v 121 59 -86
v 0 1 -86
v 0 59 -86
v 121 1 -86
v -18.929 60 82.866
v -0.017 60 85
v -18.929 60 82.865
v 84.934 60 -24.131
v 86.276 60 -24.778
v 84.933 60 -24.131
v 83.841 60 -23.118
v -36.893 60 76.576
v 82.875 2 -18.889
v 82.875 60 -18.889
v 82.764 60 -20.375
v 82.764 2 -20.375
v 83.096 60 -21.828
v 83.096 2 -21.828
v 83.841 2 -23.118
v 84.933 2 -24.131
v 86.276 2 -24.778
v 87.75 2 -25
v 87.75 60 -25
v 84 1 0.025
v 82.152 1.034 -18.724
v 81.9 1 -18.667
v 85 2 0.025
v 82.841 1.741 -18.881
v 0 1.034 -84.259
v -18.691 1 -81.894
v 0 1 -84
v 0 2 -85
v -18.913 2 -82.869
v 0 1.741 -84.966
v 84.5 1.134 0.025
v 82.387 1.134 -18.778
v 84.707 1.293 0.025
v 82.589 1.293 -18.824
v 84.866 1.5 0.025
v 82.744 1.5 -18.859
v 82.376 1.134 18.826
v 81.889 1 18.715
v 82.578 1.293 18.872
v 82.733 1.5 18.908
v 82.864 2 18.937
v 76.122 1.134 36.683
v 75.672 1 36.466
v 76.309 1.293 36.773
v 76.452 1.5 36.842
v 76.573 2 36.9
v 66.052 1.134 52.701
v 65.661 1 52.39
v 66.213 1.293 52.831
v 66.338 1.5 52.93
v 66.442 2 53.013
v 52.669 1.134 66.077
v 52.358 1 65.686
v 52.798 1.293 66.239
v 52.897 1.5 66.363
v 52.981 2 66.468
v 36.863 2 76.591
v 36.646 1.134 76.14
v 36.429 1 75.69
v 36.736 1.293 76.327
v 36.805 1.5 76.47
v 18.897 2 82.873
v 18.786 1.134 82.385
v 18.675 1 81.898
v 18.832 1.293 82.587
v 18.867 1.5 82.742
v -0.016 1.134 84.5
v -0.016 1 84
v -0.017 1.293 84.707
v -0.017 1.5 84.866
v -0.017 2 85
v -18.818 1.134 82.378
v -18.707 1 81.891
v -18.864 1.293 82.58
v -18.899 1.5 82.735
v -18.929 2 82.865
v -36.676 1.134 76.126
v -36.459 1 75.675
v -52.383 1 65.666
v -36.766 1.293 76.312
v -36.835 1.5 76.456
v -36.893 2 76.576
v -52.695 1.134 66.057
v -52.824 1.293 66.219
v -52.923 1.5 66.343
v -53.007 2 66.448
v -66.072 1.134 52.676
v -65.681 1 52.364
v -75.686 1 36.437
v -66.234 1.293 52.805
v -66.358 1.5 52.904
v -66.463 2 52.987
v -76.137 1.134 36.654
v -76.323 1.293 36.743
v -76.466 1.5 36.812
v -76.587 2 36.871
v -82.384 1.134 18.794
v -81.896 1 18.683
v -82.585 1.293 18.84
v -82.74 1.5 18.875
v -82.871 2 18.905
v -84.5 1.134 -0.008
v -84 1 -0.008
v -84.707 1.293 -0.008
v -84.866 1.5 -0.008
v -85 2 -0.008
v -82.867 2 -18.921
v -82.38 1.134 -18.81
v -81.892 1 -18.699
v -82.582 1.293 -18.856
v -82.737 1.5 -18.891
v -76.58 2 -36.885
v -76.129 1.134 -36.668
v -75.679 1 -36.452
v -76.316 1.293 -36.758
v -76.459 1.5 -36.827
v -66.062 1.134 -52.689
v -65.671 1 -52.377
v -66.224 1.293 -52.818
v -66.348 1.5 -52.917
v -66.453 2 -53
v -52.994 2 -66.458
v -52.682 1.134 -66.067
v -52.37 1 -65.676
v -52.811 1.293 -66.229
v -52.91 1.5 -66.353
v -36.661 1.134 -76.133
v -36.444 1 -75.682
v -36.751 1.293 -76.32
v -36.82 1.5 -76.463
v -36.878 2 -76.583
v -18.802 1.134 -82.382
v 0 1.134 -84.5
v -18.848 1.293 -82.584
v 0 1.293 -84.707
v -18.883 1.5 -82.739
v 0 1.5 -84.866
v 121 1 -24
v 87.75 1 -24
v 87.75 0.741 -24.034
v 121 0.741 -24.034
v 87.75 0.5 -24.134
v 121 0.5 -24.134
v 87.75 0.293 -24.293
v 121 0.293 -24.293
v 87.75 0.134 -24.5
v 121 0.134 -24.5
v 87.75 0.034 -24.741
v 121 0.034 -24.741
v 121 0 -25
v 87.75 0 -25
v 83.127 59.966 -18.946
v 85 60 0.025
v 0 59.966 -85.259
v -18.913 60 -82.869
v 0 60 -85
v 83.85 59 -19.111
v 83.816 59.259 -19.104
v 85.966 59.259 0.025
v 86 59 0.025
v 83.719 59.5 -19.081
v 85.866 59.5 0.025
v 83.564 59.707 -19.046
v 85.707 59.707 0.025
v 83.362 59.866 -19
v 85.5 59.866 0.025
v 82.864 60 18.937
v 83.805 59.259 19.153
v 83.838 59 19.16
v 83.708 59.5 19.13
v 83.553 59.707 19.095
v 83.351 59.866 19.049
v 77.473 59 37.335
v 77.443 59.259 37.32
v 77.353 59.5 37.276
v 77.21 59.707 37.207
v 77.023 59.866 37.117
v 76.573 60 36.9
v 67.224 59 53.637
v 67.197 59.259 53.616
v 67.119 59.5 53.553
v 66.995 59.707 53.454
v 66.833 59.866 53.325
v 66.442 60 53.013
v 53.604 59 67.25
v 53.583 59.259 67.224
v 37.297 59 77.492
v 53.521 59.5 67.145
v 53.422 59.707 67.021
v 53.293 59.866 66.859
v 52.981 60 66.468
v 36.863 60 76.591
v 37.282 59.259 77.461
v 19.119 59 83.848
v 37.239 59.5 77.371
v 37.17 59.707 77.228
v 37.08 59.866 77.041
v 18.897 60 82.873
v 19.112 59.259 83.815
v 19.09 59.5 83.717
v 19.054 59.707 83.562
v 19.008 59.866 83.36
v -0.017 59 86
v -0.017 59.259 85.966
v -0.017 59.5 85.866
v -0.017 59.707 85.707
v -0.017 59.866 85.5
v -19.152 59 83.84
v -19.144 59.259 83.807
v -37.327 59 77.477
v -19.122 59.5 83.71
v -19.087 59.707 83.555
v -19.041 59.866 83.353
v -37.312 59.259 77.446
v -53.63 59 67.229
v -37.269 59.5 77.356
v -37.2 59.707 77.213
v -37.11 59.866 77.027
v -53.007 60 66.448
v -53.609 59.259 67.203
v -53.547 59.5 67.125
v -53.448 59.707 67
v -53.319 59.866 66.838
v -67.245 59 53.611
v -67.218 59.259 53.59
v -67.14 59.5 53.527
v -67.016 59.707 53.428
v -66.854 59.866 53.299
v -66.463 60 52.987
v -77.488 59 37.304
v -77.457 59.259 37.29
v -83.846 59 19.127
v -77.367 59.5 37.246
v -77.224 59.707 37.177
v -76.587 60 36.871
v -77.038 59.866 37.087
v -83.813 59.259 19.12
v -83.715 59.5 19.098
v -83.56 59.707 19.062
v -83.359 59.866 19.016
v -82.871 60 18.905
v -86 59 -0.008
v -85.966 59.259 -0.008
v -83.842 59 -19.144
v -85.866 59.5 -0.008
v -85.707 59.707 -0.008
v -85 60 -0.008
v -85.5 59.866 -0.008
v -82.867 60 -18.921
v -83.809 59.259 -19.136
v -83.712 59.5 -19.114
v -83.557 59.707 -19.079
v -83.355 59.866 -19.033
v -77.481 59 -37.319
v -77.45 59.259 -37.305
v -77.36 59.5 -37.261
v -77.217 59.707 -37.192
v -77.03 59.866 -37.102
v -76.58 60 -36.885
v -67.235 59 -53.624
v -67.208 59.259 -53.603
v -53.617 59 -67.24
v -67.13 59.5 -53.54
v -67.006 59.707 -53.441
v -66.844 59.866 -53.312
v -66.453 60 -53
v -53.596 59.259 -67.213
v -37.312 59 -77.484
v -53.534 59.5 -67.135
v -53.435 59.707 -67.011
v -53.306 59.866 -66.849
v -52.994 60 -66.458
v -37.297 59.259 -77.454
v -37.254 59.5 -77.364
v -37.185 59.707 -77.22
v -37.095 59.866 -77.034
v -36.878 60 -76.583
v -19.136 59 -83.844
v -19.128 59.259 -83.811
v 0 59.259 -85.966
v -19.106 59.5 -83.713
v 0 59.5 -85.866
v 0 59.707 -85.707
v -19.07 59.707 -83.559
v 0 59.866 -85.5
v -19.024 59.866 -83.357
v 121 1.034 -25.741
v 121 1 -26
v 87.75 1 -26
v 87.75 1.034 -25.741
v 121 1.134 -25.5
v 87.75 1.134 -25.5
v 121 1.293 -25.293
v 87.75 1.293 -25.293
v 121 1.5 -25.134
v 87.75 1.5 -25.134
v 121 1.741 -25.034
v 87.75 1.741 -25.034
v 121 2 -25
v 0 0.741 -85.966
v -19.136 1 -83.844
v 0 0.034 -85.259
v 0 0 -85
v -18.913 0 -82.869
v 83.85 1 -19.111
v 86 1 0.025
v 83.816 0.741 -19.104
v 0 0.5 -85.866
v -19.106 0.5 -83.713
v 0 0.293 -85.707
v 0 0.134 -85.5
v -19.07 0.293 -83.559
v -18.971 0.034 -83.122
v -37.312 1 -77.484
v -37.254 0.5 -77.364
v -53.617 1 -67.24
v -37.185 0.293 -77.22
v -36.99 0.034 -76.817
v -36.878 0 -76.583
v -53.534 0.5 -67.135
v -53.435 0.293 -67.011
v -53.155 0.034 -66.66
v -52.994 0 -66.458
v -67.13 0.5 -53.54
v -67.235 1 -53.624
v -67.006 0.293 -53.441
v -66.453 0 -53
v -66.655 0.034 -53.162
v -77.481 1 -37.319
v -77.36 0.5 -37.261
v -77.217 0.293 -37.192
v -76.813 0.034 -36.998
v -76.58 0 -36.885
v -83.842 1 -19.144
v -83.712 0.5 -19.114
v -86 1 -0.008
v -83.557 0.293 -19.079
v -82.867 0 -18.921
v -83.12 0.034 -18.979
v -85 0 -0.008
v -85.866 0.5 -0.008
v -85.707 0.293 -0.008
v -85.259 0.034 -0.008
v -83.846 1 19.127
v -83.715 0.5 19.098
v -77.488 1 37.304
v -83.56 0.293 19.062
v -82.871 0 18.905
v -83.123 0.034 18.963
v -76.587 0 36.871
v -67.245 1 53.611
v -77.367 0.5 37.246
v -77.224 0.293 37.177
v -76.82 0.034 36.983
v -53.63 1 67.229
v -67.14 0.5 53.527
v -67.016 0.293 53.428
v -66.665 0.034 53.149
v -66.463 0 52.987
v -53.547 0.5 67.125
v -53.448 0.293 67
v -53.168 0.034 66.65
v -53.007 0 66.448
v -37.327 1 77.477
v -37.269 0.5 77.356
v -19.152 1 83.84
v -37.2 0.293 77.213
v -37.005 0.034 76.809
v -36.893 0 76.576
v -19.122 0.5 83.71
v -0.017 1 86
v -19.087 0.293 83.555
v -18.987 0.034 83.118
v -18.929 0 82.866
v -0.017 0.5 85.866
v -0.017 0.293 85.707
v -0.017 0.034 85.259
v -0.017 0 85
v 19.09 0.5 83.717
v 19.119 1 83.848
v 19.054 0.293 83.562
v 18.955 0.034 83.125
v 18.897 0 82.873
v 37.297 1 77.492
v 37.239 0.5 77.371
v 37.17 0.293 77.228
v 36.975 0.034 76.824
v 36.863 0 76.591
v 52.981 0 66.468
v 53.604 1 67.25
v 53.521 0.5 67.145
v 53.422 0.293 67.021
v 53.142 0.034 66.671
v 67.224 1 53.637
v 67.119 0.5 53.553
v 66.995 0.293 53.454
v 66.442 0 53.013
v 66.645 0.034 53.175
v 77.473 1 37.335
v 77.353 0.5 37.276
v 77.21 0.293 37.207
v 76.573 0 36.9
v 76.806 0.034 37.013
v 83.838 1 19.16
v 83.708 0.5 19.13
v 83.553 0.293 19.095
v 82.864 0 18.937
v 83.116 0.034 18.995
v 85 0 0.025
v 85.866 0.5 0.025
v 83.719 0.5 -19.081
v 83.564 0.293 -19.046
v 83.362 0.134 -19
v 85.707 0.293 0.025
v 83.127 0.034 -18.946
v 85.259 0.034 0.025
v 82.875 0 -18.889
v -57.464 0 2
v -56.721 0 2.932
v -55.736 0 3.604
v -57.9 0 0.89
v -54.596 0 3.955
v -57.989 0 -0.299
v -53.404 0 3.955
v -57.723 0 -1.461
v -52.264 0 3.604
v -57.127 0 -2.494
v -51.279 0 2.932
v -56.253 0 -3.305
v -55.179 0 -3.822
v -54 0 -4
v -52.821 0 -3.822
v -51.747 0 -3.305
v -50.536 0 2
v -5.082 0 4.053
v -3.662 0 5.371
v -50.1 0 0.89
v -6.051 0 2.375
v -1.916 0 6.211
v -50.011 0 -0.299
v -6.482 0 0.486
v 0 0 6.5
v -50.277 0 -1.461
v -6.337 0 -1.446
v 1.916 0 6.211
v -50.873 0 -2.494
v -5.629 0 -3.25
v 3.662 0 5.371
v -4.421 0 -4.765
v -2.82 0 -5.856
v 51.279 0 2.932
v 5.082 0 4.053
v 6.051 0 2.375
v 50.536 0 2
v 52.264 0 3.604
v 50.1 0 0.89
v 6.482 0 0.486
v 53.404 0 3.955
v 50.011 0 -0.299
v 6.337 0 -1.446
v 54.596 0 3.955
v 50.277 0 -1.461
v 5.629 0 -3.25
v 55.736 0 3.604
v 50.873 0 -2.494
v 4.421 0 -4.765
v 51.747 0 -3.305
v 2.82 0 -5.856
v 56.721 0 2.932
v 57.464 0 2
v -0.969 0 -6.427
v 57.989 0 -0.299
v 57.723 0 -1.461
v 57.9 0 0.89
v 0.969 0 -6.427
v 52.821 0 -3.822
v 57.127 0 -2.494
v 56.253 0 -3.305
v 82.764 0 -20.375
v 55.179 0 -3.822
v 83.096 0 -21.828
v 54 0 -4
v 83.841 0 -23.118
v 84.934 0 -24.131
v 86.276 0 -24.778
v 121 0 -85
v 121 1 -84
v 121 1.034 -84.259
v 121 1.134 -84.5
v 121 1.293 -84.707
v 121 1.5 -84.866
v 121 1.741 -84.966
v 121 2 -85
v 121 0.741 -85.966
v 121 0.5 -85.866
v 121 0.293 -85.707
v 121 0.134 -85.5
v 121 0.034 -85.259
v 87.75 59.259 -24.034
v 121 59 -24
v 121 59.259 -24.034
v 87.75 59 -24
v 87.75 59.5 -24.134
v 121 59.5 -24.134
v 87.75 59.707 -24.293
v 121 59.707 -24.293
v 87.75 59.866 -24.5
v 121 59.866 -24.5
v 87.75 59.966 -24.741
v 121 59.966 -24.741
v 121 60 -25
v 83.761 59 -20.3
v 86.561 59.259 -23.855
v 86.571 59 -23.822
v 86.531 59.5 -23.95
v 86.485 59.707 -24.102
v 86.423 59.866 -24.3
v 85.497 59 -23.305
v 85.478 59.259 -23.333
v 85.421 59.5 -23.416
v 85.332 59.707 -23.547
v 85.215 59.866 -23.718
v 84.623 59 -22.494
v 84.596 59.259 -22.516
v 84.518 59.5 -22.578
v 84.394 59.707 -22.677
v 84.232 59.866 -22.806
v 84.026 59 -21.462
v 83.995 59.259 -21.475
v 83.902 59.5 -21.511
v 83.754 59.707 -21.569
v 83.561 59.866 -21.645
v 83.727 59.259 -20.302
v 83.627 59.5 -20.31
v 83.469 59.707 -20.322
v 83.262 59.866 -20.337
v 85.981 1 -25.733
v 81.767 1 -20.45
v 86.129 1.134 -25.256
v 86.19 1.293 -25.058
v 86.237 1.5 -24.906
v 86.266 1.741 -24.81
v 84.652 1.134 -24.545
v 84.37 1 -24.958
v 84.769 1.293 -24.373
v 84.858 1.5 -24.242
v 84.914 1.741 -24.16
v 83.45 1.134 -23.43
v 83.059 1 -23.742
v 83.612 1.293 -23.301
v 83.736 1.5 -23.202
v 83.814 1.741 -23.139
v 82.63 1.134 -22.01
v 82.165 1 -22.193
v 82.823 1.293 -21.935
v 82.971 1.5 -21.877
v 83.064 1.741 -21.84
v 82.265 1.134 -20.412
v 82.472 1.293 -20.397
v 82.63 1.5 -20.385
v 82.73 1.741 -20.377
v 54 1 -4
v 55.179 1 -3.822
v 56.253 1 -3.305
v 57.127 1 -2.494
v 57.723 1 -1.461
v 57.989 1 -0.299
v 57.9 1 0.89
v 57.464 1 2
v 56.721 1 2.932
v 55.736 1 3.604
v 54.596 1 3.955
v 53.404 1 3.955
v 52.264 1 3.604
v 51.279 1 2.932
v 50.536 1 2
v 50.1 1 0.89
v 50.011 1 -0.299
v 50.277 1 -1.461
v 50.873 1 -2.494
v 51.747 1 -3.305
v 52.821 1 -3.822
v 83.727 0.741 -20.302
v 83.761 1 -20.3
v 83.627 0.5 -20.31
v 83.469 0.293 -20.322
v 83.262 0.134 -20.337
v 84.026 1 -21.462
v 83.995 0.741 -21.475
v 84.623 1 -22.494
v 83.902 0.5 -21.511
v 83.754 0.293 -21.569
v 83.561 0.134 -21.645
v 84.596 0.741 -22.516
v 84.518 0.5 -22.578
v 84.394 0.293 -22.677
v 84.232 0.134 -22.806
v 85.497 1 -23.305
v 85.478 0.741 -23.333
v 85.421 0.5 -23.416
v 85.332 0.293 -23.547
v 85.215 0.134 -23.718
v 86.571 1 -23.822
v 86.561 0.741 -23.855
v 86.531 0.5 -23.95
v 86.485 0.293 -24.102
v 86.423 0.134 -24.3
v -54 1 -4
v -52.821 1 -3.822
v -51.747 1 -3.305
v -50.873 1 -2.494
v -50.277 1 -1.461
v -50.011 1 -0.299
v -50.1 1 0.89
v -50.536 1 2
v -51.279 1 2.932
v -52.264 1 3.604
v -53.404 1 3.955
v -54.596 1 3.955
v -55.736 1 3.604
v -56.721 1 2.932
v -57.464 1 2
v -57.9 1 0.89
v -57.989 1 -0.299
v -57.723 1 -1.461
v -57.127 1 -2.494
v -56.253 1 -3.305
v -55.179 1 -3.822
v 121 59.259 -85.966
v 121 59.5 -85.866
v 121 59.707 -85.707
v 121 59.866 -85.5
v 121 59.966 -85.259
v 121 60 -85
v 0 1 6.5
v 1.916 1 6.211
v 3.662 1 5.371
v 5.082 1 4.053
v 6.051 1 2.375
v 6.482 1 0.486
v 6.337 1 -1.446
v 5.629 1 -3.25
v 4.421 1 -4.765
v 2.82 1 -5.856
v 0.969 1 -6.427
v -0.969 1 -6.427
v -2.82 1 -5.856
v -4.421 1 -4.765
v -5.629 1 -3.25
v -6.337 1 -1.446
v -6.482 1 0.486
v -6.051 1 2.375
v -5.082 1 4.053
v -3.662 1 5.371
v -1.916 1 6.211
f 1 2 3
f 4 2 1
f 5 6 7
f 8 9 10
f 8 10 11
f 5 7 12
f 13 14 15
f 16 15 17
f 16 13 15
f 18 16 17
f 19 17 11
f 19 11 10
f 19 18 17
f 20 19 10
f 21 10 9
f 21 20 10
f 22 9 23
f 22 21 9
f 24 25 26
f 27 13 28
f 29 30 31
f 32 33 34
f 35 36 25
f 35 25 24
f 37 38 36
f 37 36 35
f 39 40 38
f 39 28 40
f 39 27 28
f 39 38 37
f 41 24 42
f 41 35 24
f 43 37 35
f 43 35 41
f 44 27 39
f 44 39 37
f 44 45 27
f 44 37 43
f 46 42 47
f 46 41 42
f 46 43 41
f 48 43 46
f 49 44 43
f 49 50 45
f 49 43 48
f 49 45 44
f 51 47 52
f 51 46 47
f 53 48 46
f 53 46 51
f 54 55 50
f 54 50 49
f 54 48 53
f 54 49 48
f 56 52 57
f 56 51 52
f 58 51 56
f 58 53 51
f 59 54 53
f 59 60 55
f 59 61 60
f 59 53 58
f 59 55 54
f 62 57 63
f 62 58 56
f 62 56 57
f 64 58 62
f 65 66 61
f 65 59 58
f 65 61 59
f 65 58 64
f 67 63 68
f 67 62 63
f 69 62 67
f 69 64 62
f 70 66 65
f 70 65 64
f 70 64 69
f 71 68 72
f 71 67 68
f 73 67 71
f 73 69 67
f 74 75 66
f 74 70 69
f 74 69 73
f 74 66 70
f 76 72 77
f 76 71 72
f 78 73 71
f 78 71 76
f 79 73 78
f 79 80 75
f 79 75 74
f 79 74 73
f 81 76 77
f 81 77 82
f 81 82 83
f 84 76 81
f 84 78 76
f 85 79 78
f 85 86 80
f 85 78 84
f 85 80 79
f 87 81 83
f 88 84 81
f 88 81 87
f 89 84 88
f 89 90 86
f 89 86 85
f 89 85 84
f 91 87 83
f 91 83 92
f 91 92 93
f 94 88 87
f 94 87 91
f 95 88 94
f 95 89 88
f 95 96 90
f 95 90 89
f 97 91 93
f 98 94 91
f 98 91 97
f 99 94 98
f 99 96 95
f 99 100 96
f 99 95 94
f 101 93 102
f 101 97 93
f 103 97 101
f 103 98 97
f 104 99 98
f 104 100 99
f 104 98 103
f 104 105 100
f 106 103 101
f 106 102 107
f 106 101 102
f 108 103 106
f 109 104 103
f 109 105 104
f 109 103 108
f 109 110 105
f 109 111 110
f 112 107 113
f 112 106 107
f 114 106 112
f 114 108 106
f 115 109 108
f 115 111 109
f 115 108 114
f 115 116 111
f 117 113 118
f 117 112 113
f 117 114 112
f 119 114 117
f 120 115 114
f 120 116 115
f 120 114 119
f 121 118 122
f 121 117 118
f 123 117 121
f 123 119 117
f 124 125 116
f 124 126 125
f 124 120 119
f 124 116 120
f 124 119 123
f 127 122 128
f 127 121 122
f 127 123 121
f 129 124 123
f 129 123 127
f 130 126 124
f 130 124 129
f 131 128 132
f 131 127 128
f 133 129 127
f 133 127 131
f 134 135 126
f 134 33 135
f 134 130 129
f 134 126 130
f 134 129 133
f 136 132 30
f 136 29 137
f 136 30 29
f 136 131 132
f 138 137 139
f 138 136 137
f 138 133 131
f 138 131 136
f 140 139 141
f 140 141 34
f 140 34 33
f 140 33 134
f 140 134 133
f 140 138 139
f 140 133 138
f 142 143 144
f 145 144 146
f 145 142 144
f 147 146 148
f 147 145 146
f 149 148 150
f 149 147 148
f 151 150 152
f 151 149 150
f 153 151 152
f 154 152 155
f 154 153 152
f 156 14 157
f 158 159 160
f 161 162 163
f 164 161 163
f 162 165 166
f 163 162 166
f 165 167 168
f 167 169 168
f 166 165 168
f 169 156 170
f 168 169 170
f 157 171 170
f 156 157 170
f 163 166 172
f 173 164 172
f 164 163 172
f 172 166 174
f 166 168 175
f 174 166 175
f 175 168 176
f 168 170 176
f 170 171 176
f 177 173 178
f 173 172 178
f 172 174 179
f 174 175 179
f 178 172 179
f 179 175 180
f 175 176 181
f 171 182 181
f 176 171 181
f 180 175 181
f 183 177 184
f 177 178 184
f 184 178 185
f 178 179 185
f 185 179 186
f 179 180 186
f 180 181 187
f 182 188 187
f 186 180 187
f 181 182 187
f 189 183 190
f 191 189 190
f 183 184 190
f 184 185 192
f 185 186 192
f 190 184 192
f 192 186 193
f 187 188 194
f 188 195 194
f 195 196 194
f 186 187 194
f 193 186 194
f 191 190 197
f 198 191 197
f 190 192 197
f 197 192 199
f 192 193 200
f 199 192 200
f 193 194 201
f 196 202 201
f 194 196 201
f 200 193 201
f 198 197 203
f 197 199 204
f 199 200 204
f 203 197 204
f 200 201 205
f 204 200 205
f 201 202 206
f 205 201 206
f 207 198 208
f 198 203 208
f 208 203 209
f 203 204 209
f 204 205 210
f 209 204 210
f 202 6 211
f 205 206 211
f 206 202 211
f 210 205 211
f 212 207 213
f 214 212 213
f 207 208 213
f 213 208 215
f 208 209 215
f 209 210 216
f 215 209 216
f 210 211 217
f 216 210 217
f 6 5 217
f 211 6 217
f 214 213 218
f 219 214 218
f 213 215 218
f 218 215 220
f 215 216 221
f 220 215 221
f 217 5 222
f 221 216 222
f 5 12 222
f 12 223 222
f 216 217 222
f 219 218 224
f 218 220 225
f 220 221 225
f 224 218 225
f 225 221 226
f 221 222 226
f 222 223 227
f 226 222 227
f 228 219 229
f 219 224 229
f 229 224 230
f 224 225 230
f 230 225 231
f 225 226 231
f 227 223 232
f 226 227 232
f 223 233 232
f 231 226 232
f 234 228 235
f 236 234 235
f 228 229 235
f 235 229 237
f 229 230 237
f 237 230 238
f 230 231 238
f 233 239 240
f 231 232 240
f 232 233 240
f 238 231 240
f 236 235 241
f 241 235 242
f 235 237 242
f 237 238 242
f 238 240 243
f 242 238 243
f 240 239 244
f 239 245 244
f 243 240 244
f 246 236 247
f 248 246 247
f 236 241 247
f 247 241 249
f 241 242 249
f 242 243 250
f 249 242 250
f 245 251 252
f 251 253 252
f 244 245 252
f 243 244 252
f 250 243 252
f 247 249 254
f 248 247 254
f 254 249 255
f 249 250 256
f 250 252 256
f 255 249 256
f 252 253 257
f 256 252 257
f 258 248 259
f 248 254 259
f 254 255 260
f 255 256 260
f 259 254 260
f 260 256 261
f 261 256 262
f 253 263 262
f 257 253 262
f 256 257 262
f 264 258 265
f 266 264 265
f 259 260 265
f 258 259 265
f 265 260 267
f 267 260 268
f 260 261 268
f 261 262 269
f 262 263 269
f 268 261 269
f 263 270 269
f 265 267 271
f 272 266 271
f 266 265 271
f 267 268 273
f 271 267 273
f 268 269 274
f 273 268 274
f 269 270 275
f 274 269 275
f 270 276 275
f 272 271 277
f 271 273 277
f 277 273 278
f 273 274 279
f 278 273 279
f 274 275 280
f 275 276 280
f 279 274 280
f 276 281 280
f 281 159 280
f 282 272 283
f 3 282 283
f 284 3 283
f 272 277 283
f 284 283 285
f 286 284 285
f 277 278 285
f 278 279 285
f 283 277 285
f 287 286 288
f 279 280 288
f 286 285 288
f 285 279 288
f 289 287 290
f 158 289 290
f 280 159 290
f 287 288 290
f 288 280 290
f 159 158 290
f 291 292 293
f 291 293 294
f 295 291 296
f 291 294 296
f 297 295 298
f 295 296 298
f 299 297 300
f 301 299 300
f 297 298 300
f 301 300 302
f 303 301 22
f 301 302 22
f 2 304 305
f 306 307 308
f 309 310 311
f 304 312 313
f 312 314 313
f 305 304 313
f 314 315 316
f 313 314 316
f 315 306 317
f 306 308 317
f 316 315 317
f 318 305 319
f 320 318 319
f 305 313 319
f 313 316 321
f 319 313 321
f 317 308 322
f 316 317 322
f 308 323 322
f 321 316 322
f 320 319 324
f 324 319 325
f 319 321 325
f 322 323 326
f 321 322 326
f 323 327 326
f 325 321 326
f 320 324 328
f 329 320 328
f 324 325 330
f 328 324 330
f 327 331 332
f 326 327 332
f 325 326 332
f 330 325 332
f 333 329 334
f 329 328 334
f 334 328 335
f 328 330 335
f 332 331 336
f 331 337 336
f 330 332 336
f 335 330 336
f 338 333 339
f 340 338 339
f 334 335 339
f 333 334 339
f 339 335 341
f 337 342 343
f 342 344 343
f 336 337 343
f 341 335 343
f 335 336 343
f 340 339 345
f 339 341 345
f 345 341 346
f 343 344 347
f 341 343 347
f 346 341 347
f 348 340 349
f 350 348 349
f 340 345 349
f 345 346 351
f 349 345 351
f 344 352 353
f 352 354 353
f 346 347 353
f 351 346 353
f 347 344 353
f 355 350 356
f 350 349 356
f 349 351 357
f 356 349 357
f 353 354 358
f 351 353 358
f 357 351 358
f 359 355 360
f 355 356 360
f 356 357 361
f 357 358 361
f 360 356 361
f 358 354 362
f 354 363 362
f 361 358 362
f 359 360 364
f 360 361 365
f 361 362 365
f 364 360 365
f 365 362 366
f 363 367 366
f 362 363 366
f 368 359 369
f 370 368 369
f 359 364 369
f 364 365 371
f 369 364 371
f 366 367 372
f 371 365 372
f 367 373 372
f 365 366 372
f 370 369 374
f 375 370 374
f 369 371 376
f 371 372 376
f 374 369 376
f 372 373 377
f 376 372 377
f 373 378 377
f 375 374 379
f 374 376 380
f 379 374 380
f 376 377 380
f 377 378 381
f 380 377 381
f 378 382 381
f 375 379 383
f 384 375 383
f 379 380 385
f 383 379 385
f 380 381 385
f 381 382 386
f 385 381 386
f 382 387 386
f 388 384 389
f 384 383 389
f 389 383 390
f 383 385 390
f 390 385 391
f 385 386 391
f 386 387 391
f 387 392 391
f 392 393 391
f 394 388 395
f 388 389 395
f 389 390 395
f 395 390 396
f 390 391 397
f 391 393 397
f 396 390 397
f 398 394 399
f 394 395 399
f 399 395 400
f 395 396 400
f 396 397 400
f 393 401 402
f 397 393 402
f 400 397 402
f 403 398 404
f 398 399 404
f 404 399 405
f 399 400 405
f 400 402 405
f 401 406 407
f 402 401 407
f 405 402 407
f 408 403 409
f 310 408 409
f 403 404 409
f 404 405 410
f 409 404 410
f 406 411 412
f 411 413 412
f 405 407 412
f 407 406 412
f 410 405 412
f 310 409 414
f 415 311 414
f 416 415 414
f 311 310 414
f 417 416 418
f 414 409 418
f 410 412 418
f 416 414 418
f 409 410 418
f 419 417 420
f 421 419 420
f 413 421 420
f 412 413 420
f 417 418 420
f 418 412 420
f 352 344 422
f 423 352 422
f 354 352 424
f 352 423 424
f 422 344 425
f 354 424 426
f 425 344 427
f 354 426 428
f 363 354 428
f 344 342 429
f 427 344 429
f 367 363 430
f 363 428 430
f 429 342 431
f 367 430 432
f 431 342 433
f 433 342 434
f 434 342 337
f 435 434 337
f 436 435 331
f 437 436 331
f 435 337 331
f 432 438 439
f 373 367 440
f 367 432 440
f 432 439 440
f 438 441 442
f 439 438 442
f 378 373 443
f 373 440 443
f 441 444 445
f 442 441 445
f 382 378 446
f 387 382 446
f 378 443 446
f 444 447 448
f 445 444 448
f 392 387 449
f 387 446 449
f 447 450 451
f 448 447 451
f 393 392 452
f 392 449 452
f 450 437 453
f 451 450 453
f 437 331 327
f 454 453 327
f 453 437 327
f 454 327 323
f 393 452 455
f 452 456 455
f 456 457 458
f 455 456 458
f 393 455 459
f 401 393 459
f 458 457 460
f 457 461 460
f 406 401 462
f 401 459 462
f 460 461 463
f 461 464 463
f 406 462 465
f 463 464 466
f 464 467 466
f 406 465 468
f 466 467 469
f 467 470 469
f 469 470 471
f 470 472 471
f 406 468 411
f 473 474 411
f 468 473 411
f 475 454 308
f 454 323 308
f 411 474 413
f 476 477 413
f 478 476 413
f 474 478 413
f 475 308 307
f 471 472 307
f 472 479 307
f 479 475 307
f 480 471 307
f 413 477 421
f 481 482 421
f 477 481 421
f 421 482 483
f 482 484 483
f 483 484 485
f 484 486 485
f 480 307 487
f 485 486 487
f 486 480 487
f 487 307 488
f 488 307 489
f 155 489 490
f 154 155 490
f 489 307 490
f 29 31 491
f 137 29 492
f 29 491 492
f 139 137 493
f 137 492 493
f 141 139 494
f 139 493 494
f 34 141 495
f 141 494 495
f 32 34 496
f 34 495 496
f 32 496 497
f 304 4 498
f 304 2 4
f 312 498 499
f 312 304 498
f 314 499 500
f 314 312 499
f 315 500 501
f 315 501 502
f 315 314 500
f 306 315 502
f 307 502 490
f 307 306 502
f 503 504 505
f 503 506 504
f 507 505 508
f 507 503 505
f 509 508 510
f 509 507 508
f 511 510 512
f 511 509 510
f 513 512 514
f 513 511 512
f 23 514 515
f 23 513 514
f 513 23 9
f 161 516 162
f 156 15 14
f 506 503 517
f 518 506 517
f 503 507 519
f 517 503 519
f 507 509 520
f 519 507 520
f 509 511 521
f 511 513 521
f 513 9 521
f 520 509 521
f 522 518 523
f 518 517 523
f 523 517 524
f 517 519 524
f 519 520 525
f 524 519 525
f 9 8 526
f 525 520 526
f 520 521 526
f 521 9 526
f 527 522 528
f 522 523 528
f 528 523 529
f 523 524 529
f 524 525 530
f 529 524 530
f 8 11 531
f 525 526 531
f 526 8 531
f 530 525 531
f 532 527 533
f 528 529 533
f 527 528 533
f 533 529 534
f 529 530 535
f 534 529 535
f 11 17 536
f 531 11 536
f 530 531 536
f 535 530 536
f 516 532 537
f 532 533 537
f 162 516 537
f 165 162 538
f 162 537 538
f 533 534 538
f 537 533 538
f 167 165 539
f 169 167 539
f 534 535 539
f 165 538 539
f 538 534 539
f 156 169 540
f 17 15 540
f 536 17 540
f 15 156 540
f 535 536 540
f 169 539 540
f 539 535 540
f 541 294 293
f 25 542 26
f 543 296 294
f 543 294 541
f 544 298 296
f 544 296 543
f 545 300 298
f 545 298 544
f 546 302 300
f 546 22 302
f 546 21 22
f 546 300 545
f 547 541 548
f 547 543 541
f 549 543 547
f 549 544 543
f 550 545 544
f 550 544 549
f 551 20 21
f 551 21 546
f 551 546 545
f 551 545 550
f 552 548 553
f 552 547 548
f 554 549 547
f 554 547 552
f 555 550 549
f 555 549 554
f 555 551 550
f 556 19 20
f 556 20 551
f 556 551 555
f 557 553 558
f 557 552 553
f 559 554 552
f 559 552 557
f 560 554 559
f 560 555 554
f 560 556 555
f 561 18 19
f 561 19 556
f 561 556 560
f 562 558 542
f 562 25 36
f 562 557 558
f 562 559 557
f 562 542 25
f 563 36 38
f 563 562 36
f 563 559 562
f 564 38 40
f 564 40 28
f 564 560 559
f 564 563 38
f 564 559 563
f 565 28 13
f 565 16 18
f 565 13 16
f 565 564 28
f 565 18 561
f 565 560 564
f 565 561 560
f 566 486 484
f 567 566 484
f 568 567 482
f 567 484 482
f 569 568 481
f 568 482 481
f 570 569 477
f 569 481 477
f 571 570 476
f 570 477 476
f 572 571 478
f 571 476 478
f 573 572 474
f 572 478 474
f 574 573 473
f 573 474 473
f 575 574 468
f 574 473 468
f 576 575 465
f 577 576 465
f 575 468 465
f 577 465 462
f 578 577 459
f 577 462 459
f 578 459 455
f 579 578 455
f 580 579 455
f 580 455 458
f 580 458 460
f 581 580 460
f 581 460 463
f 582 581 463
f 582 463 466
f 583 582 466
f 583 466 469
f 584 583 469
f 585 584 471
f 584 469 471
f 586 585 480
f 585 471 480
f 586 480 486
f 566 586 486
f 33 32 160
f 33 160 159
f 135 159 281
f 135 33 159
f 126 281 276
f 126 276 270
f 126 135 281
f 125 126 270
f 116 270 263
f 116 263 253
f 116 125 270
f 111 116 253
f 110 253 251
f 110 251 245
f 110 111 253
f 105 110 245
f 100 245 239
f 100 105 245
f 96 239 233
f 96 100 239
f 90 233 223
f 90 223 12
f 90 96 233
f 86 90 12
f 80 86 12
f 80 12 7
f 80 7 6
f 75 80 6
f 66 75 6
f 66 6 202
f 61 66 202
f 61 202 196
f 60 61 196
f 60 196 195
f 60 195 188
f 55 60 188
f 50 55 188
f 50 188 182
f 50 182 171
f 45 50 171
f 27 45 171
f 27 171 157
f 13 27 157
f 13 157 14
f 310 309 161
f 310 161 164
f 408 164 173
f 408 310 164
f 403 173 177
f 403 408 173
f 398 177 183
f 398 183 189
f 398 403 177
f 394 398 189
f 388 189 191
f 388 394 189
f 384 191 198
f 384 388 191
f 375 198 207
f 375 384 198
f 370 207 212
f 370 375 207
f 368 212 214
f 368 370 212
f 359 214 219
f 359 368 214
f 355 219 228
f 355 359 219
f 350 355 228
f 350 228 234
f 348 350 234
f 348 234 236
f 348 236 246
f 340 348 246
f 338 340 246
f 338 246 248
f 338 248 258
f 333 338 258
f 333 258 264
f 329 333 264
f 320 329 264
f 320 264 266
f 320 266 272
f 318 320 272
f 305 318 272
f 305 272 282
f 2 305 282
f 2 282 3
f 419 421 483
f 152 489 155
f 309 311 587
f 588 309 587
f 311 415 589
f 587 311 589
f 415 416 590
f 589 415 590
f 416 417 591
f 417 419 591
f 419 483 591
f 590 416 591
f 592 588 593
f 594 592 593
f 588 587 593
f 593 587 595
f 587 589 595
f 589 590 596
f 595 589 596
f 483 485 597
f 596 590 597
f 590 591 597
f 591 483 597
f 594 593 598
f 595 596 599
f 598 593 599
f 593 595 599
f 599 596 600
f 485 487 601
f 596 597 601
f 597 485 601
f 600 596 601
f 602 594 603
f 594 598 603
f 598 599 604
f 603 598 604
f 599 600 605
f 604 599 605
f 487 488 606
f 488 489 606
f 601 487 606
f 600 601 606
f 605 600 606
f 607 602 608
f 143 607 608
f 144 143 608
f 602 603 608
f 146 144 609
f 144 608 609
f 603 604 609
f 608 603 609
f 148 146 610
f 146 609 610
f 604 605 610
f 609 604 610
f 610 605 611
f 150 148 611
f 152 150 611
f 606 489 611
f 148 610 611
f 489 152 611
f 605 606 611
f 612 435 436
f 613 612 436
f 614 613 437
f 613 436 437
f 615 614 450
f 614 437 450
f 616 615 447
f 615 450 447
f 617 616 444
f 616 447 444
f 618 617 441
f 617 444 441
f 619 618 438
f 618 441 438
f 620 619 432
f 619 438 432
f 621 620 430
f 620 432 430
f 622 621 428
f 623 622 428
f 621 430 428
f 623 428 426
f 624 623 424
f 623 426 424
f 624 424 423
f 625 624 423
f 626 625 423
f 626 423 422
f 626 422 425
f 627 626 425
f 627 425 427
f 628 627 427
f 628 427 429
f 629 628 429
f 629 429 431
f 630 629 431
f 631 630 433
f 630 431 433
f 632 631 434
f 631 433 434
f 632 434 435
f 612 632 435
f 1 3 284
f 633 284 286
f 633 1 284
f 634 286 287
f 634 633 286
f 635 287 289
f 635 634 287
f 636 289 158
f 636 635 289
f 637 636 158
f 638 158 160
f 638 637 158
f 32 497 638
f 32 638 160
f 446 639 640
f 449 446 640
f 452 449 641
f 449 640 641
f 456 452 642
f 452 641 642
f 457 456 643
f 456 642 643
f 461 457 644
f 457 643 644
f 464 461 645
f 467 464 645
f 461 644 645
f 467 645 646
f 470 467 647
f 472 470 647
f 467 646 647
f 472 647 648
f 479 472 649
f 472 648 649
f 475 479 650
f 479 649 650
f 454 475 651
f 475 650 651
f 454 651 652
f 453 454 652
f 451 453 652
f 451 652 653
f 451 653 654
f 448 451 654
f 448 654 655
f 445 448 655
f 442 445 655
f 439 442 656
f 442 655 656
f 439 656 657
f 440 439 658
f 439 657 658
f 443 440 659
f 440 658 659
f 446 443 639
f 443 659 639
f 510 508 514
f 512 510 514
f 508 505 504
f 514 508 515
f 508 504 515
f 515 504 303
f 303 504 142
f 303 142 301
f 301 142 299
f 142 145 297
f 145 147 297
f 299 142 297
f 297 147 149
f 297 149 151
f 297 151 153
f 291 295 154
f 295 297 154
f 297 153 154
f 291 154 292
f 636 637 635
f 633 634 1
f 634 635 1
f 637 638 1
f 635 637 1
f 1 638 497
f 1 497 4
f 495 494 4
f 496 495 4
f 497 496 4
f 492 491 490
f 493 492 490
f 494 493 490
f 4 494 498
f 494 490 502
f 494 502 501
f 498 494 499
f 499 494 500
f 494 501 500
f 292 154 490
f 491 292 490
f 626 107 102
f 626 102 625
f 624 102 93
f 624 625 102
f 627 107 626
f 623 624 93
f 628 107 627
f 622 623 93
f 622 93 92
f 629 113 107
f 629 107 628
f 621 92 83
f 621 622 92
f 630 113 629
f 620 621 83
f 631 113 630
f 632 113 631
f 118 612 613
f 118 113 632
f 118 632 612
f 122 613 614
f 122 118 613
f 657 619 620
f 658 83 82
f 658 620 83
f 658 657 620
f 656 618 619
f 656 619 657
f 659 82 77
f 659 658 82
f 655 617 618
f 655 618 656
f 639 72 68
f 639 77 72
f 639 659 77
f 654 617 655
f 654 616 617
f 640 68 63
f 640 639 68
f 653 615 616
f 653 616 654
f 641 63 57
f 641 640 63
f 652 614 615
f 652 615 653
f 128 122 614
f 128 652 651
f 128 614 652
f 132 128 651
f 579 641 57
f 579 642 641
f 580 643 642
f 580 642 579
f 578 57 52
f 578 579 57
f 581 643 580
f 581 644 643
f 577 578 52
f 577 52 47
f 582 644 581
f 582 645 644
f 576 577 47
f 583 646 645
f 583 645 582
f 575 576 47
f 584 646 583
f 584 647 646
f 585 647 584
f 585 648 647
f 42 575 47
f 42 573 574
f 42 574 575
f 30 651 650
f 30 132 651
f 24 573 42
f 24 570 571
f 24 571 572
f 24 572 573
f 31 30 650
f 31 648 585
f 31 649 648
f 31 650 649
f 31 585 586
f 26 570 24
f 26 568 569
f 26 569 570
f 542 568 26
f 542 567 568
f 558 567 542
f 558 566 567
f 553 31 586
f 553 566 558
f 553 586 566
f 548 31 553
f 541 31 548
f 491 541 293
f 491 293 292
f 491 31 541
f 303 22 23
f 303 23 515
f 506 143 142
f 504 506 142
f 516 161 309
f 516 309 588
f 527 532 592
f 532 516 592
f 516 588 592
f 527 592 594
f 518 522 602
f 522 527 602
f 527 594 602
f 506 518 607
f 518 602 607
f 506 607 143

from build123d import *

# Parameters (mm, degrees)
BOSS_EXTRUDE1_DEPTH = 1
BOSS_EXTRUDE2_DEPTH = 60
SKETCH2_R           = 6.5
CUT_EXTRUDE1_DEPTH  = 1
FILLET1_R           = 1
SKETCH3_R           = 4
CUT_EXTRUDE2_DEPTH  = 1


with BuildPart() as part:
    # Sketch1 → Boss-Extrude1 (new body)
    with BuildSketch(Plane(origin=(0, 0, 0), x_dir=(1, 0, 0), z_dir=(0, 1, 0))):
        with BuildLine():
            Line((121, 24), (121, 86))
            Line((121, 86), (0, 86))
            ThreePointArc((0, 86), (-53.630422544, -67.229292557), (83.849659702, 19.111111111))
            ThreePointArc((83.849659702, 19.111111111), (84.622700034, 22.494438258), (87.749643874, 24))
            Line((87.749643874, 24), (121, 24))
        make_face()
    extrude(amount=BOSS_EXTRUDE1_DEPTH)

    # Sketch1<3> → Boss-Extrude2 (add)
    with BuildSketch(Plane(origin=(0, 0, 0), x_dir=(1, 0, 0), z_dir=(0, 1, 0))):
        with BuildLine():
            ThreePointArc((87.749643874, 24), (84.622700034, 22.494438258), (83.849659702, 19.111111111))
            ThreePointArc((83.849659702, 19.111111111), (-53.630422544, -67.229292557), (0, 86))
            Line((0, 86), (121, 86))
            Line((121, 86), (121, 85))
            Line((121, 85), (120, 85))
            Line((120, 85), (0, 85))
            ThreePointArc((0, 85), (-53.006812979, -66.447556597), (82.874663659, 18.888888889))
            ThreePointArc((82.874663659, 18.888888889), (83.840964074, 23.118047822), (87.749643874, 25))
            Line((87.749643874, 25), (120, 25))
            Line((120, 25), (121, 25))
            Line((121, 25), (121, 24))
            Line((121, 24), (87.749643874, 24))
        make_face()
    extrude(amount=BOSS_EXTRUDE2_DEPTH)

    # Sketch2 → Cut-Extrude1 (cut)
    with BuildSketch(Plane(origin=(0, 1, 0), x_dir=(1, 0, 0), z_dir=(0, 1, 0))):
        with Locations(Location((0, 0, 0), (0, 0, 270))):
            Circle(SKETCH2_R)
    extrude(amount=-CUT_EXTRUDE1_DEPTH, mode=Mode.SUBTRACT)

    # Fillet1
    fillet1_edges = [part.edges().sort_by_distance(p)[0] for p in [
        (104.374821937, 1, -25),
        (83.840964074, 1, -23.118047822),
        (60.5, 1, -85),
        (60.5, 0, -86),
        (104.374821937, 0, -24),
        (84.622700034, 0, -22.494438258),
        (60.5, 60, -86),
        (104.374821937, 60, -24),
        (84.622700034, 60, -22.494438258),
        (-53.006812979, 1, 66.447556597),
        (-53.630422544, 0, 67.229292557),
        (-53.630422544, 60, 67.229292557),
    ]]
    fillet(fillet1_edges, radius=FILLET1_R - 0.0001)  # a hair under: the kernel refuses the full size

    # Sketch3 → Cut-Extrude2 (cut)
    with BuildSketch(Plane.XZ):
        with Locations(Location((-54, 0, 0), (0, 0, 270))):
            Circle(SKETCH3_R)
        with Locations(Location((54, 0, 0), (0, 0, 270))):
            Circle(SKETCH3_R)
    extrude(amount=-CUT_EXTRUDE2_DEPTH, mode=Mode.SUBTRACT)


solid = part.part
